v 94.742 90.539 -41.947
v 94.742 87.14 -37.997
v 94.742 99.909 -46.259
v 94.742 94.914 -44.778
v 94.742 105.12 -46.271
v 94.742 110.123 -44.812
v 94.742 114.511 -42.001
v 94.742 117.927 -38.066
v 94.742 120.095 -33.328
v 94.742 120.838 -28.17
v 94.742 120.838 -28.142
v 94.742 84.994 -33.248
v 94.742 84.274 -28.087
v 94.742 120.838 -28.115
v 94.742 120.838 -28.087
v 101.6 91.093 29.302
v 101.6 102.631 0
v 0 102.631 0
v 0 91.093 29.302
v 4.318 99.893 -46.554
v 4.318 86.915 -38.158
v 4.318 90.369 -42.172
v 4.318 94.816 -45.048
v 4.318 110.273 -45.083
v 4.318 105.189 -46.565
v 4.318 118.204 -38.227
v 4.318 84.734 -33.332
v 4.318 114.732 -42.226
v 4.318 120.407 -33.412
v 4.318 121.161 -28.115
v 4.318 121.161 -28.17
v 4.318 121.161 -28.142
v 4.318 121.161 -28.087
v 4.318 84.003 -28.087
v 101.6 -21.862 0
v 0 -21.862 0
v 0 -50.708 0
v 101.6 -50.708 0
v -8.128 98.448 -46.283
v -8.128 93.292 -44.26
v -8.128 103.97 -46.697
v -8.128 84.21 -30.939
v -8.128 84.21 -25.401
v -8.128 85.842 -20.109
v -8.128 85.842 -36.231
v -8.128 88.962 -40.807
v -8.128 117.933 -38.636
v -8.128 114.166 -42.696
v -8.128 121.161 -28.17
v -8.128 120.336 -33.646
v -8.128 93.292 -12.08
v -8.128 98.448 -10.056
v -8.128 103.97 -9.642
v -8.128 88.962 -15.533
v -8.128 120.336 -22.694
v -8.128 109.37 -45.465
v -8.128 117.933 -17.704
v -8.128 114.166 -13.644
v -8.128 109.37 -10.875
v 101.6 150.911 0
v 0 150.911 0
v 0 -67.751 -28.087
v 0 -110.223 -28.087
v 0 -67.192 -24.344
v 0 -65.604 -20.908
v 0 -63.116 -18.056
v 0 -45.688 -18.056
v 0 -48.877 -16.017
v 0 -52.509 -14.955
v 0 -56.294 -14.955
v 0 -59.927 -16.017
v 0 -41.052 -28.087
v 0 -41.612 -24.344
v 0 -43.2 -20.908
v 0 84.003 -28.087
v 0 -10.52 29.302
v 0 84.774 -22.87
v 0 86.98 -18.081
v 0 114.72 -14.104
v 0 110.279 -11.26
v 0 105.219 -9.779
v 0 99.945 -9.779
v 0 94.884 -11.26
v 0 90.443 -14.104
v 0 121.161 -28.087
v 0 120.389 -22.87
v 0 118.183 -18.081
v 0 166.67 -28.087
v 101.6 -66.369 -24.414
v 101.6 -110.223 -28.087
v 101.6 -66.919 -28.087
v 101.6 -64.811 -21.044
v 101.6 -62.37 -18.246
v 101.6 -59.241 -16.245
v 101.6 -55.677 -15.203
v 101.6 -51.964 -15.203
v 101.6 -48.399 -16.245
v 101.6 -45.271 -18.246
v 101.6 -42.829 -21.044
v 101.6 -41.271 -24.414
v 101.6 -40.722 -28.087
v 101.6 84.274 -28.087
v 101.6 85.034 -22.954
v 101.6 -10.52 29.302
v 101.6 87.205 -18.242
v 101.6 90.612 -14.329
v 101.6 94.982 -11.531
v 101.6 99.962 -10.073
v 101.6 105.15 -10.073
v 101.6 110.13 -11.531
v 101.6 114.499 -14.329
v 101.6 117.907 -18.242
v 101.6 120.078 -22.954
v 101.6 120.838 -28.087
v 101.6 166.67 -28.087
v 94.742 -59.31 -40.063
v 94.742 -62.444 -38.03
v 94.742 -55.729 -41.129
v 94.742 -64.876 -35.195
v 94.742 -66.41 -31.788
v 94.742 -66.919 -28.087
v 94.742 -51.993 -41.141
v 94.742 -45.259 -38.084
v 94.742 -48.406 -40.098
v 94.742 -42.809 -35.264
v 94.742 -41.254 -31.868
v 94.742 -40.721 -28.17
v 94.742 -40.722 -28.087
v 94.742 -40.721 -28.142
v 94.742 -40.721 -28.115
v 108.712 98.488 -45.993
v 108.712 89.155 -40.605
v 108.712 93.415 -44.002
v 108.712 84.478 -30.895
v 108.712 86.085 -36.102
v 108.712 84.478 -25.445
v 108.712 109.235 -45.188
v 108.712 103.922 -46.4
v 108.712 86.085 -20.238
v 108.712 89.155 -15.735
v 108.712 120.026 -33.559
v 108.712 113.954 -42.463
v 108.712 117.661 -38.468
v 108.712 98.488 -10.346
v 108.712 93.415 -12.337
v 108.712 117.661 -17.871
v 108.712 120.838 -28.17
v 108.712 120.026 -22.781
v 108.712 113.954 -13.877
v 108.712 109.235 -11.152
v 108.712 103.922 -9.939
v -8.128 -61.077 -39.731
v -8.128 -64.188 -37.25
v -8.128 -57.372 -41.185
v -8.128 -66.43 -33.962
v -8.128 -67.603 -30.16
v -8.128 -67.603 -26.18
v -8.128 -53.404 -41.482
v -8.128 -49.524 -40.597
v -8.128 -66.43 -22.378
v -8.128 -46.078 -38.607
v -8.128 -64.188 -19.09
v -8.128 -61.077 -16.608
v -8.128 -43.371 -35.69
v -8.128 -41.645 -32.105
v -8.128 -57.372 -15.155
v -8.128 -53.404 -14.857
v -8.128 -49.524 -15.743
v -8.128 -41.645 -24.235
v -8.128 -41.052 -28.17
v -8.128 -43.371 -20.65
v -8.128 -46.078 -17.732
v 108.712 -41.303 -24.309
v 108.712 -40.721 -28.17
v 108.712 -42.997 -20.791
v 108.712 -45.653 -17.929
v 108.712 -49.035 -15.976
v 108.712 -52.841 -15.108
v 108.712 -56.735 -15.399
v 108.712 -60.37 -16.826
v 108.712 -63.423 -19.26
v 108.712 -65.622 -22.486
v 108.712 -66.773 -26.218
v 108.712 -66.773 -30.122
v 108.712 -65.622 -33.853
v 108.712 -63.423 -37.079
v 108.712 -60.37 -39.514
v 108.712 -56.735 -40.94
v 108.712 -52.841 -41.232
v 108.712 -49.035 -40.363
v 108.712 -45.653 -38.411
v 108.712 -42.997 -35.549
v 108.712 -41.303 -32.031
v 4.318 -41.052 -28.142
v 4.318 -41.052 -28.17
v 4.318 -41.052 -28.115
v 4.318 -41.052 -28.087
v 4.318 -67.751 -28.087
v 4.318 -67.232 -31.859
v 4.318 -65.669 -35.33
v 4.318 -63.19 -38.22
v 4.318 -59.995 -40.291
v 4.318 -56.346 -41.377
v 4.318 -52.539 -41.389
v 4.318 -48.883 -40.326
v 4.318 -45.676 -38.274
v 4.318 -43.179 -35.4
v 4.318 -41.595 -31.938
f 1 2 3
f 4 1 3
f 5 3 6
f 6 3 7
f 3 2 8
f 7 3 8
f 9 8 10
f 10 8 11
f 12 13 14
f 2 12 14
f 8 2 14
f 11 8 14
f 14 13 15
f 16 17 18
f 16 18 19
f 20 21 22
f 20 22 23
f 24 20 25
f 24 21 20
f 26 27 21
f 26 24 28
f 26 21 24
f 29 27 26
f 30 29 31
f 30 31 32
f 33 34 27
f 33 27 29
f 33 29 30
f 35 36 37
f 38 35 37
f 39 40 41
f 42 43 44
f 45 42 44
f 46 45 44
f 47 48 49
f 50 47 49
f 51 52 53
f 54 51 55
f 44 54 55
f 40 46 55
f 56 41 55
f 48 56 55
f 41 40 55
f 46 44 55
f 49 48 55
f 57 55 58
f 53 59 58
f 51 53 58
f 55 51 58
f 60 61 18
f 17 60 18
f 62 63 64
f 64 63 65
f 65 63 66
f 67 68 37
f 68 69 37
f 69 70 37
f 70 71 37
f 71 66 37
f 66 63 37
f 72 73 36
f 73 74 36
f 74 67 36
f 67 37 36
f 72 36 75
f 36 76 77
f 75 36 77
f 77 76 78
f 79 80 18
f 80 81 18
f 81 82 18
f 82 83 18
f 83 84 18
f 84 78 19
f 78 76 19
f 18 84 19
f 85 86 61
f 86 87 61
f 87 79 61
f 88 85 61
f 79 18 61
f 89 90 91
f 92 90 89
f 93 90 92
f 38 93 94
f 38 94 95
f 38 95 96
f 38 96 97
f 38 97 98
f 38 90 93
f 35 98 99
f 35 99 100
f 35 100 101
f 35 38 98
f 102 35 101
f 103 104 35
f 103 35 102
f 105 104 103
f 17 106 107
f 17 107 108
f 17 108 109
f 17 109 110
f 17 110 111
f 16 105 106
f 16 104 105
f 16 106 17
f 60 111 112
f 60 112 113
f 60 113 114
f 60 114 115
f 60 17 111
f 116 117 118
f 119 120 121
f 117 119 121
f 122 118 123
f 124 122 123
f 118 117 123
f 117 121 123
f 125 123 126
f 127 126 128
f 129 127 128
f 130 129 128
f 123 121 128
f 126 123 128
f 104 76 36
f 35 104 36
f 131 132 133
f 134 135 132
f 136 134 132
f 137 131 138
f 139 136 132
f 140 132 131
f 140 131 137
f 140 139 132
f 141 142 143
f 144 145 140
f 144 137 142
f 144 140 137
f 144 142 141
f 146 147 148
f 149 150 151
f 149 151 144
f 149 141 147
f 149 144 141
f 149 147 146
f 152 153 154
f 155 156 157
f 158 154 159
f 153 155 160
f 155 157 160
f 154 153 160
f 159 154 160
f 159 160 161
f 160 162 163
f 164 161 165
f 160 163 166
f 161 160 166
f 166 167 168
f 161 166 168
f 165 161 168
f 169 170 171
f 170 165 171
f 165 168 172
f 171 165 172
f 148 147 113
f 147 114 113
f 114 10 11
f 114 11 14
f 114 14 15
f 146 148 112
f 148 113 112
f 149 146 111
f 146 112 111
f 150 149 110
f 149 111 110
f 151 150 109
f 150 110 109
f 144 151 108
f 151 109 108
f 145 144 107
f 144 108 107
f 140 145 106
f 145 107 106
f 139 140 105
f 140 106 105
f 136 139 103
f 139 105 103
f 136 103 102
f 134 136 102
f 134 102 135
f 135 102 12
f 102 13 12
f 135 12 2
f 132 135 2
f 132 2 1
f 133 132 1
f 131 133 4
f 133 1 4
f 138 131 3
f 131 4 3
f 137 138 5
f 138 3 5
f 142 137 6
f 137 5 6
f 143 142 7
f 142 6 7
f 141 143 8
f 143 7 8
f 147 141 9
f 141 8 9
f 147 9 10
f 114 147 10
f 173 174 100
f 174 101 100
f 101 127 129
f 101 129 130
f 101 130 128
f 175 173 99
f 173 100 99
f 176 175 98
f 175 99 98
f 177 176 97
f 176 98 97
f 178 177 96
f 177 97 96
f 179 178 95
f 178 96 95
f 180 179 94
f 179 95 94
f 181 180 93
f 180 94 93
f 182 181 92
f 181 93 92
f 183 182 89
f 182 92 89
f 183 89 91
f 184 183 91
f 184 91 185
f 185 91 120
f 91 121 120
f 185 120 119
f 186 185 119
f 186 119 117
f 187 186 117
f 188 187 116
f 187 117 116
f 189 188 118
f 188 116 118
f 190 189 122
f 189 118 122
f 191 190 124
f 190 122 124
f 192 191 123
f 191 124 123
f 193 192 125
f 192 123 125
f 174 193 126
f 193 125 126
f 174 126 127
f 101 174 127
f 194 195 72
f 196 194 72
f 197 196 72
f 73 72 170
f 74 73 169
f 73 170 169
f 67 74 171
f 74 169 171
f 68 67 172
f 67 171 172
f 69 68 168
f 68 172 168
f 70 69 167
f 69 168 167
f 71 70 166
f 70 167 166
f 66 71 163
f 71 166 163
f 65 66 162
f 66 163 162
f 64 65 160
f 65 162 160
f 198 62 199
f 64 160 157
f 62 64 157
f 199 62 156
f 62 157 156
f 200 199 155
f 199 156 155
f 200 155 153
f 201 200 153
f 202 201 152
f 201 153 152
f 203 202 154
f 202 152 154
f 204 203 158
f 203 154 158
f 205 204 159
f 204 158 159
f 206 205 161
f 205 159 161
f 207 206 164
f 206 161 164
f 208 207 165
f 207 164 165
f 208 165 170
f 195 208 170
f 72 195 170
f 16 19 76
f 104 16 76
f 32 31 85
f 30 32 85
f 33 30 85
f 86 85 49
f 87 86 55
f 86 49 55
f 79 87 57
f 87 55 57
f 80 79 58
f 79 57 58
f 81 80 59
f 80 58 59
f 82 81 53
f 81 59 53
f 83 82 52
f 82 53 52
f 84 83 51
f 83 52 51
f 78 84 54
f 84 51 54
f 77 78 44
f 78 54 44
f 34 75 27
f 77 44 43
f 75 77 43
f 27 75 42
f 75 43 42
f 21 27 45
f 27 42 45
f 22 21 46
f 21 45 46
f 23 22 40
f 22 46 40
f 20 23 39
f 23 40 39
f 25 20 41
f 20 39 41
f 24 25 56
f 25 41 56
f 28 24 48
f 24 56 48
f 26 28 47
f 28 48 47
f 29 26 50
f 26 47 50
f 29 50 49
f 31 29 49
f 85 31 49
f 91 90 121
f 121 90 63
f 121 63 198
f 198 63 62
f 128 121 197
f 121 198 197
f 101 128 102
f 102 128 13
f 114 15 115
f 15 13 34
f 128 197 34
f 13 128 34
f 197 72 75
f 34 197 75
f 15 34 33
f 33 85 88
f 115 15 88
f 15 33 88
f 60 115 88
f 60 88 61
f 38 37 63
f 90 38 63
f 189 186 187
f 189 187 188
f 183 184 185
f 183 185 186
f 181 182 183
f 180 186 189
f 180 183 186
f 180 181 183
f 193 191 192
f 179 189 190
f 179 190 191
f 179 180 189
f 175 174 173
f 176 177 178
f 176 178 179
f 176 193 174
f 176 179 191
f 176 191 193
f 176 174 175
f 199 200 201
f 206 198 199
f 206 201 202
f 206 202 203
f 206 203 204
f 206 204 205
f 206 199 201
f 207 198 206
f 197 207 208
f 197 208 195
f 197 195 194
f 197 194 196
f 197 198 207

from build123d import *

# Parameters (mm, degrees)
F1_DEPTH      = 101.6
F2_R          = 13.3499518003
F2_R_2        = 18.5793981889
F3_DEPTH      = 8.128
F3_DEPTH_BACK = 4.318
F5_START      = 94.742
F4_R          = 13.0989640124
F4_R_2        = 18.281744148
F5_DEPTH      = 13.97


with BuildPart() as f1:
    # F0 (on Right) → F1 (new body)
    with BuildSketch(Plane.YZ):
        Polygon((-21.862315014, 0), (-50.7084243, 0), (-110.2225035429, -28.0870012939), (166.6699335306, -28.0870012939), (150.910705328, 0), (102.6314273477, 0), align=None)
        Polygon((-10.5197704383, 29.3015744537), (-21.862315014, 0), (102.6314273477, 0), (91.0929739475, 29.3015744537), align=None)
    extrude(amount=F1_DEPTH)

    # F2 (on Right) → F3 (join, two sides)
    with BuildSketch(Plane.YZ) as f3_sk:
        with Locations((-54.4017069042, -28.1698741019)):
            Circle(F2_R)
        with Locations((102.5818586349, -28.1698741019)):
            Circle(F2_R_2)
    extrude(amount=-F3_DEPTH)
    extrude(f3_sk.sketch, amount=F3_DEPTH_BACK)

    # F4 (on Right) → F5 (join)
    with BuildSketch(Plane.YZ.offset(F5_START)):
        with Locations((-53.8203082979, -28.1698741019)):
            Circle(F4_R)
        with Locations((102.5559827685, -28.1698741019)):
            Circle(F4_R_2)
    extrude(amount=F5_DEPTH)


solid = f1.part
